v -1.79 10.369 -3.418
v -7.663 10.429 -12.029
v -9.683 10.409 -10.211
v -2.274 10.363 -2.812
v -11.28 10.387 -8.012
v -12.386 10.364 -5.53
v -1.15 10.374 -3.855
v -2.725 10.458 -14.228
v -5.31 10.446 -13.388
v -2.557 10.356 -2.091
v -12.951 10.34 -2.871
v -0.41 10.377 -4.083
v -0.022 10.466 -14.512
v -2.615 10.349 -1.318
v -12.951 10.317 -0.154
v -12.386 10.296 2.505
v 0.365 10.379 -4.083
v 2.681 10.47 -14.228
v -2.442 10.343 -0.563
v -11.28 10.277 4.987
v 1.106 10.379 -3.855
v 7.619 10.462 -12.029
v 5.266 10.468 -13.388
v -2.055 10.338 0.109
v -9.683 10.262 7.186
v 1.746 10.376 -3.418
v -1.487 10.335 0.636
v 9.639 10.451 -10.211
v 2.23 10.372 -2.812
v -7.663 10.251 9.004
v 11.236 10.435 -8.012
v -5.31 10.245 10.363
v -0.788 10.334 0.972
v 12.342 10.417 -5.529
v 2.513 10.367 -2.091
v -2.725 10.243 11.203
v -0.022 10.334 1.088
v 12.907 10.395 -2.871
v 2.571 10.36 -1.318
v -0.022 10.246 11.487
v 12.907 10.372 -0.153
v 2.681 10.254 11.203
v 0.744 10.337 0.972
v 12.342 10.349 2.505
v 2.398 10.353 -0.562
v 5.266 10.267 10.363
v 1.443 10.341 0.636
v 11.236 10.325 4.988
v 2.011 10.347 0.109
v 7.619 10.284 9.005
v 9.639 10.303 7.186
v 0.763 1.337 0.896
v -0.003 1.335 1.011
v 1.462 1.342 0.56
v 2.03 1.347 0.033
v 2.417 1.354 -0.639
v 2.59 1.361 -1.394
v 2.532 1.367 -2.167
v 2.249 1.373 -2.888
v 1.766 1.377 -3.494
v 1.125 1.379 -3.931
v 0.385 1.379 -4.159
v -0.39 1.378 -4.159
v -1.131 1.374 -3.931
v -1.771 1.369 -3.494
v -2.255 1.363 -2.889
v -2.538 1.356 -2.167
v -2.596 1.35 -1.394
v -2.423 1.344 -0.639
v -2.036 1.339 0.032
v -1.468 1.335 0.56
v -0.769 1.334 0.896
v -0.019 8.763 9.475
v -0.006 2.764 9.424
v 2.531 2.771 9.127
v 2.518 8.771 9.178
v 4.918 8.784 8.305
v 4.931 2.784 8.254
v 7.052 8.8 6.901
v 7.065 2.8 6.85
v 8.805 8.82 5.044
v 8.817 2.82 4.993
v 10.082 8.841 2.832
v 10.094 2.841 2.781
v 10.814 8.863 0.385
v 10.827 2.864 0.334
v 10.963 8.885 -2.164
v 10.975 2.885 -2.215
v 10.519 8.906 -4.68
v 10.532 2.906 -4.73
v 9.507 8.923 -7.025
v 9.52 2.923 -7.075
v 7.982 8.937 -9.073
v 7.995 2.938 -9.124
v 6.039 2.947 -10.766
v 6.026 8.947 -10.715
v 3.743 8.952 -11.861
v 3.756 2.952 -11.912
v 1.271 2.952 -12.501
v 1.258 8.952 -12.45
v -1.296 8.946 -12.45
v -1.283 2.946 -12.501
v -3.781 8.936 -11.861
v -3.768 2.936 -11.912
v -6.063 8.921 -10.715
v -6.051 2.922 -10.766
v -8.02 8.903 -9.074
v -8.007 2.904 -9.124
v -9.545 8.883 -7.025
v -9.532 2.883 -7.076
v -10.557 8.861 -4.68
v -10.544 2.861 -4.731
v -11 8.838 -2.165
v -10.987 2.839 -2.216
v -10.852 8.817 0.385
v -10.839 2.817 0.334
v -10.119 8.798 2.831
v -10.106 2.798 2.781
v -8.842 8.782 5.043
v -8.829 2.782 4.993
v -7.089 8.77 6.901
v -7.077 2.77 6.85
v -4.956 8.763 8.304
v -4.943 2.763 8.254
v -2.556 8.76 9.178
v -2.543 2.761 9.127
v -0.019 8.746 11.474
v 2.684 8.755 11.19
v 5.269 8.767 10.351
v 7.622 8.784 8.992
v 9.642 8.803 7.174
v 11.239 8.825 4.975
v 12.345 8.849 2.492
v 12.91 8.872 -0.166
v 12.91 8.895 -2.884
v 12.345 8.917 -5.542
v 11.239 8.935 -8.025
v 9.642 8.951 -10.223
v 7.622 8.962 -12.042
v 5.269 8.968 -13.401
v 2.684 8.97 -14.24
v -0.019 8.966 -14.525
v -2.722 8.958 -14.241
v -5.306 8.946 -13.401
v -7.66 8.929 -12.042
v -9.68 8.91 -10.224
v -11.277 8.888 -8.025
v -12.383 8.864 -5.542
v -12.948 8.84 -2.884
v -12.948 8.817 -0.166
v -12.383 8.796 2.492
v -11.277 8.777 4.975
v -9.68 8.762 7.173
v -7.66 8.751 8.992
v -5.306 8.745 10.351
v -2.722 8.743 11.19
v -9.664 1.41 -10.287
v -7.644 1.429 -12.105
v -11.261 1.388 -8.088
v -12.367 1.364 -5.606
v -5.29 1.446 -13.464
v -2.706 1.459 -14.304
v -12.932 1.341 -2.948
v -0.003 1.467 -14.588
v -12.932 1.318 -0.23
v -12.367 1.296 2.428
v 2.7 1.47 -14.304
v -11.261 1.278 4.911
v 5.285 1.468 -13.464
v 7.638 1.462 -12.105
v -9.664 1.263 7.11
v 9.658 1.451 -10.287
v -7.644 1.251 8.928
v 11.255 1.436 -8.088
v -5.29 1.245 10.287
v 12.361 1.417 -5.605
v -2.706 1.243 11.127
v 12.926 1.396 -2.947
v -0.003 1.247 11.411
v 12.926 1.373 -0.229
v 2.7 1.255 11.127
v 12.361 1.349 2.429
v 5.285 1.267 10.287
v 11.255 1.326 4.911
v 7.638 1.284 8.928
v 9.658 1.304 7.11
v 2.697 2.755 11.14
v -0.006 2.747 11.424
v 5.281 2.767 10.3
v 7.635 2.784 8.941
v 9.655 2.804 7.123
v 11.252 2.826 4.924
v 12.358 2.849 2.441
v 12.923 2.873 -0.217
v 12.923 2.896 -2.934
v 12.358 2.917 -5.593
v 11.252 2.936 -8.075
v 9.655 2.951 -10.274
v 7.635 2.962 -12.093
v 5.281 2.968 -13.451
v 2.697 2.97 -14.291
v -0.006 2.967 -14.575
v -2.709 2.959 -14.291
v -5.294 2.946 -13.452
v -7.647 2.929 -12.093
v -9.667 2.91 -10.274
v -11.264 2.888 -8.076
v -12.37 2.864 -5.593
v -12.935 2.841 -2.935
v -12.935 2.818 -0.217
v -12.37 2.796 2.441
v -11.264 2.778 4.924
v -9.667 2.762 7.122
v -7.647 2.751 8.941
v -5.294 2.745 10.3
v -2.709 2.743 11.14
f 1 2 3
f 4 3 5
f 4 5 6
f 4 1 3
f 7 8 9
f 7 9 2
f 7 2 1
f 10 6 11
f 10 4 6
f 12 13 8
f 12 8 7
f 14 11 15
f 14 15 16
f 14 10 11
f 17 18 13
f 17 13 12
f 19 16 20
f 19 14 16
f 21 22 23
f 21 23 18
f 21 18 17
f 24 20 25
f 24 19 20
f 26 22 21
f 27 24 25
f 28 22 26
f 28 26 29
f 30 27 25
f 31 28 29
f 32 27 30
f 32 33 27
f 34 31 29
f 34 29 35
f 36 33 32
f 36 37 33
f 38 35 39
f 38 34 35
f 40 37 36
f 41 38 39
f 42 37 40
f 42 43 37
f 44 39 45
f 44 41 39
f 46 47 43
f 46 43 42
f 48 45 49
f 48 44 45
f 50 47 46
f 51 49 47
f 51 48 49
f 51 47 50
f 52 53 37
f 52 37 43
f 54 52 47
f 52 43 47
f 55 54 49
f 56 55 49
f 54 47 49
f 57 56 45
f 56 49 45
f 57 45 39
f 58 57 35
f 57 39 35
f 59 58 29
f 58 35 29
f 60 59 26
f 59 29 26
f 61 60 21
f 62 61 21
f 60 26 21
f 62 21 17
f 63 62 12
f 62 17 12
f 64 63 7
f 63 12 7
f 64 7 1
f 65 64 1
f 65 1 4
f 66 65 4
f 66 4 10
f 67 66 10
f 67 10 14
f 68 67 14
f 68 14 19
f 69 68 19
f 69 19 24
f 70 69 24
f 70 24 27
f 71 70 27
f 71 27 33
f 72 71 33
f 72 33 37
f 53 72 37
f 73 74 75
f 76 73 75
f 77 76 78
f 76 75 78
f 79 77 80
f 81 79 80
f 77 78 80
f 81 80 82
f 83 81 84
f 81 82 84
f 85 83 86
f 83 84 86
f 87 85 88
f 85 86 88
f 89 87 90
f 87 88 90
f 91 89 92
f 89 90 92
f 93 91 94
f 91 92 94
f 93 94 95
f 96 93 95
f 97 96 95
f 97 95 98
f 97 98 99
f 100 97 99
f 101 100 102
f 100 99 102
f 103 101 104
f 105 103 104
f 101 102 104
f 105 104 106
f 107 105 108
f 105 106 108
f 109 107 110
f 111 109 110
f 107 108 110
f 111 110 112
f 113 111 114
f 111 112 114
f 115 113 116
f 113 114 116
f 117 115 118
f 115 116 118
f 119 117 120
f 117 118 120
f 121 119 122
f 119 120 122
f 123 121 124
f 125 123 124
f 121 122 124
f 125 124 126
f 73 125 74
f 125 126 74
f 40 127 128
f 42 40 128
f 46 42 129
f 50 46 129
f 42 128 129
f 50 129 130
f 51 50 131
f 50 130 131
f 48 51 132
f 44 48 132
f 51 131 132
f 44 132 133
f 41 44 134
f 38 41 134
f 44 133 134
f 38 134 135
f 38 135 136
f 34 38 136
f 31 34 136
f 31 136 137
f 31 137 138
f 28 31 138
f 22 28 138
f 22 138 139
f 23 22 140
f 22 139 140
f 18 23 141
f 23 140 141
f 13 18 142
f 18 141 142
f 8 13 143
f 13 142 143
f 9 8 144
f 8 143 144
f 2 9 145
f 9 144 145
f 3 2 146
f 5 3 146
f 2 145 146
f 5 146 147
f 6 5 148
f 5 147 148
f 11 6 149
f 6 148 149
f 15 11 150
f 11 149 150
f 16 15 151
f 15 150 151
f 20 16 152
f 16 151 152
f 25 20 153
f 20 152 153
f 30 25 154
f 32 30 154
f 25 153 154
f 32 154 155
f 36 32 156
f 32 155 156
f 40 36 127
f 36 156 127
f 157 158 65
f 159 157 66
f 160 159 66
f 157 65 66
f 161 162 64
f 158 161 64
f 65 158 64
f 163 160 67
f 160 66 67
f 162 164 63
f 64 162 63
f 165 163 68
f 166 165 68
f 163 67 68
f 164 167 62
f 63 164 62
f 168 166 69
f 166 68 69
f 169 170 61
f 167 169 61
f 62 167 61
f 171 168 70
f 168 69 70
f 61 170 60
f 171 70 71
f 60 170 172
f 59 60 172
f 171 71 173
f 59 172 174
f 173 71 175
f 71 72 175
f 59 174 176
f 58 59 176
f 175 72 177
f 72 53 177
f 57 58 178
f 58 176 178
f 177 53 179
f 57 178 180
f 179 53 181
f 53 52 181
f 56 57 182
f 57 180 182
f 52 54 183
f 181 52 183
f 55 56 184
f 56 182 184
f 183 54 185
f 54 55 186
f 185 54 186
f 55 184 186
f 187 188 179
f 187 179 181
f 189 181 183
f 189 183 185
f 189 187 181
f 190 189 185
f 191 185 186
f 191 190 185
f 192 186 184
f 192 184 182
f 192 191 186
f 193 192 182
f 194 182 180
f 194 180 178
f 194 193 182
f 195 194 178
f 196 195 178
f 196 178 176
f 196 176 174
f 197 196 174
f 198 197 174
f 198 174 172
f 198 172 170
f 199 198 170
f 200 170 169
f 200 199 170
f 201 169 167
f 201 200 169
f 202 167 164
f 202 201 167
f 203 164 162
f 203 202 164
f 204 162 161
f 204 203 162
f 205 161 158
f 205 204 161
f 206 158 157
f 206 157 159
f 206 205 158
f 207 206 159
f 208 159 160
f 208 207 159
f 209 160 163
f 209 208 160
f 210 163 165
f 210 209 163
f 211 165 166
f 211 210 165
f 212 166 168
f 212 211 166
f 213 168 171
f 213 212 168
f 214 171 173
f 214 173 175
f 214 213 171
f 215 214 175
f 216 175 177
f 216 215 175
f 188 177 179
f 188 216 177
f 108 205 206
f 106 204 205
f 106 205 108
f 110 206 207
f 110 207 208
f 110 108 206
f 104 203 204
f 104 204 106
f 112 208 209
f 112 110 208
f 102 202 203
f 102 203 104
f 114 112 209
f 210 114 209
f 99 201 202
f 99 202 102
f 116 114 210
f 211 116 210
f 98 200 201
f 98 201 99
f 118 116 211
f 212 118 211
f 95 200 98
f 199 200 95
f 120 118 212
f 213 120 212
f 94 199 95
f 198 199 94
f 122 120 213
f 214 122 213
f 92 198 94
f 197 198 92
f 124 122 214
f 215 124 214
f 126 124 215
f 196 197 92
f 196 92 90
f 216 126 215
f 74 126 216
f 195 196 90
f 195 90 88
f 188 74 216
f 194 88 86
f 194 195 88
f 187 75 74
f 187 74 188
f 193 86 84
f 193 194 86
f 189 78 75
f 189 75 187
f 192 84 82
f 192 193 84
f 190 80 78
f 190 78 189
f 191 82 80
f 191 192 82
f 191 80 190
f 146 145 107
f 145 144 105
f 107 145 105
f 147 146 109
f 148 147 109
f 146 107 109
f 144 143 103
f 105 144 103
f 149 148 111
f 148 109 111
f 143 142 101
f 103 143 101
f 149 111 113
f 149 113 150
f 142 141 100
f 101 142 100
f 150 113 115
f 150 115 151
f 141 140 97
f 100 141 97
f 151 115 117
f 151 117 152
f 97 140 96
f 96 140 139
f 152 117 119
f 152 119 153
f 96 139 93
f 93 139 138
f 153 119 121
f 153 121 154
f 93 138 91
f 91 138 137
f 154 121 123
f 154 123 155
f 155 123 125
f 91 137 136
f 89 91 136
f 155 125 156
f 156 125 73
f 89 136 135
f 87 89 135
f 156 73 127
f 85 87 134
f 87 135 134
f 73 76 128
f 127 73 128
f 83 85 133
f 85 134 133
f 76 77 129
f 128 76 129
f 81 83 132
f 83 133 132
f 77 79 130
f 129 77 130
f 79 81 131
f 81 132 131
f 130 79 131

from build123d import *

# Parameters (mm, degrees)
SKETCH2_R           = 11
BOSS_EXTRUDE1_DEPTH = 6
SKETCH3_W           = 3.45
SKETCH3_H           = 3.45
CUT_EXTRUDE1_DEPTH  = 18.841034143
SKETCH4_R           = 13
BOSS_EXTRUDE2_DEPTH = 1.5
SKETCH5_W           = 3.45
SKETCH5_H           = 3.45
CUT_EXTRUDE2_DEPTH  = 22.625712586
SKETCH6_R           = 2.6
CUT_EXTRUDE3_DEPTH  = 22.625712586


with BuildPart() as part:
    # Sketch2 → Boss-Extrude1 (new body)
    with BuildSketch(Plane(origin=(-0.006046198, 2.843115255, 0.024063532), x_dir=(0.9999977389340391, 0.002126453123543878, 1.7997853821493017e-05), z_dir=(-0.00212652928721231, 0.9999619230641714, 0.008463468260412206))):
        with Locations(Location((-2.8797e-05, 1.599942694, 0), (0, 0, 270))):
            Circle(SKETCH2_R)
    extrude(amount=BOSS_EXTRUDE1_DEPTH)

    # Sketch3 → Cut-Extrude1 (cut, through all)
    with BuildSketch(Plane(origin=(-0.018805374, 8.842886793, 0.074844342), x_dir=(0.9999977389340391, 0.002126453123543878, 1.7997853821493024e-05), z_dir=(-0.00212652928721231, 0.9999619230641714, 0.00846346826041221))):
        with Locations((-2.8797e-05, 1.599942694)):
            Rectangle(SKETCH3_W, SKETCH3_H)
    extrude(amount=-CUT_EXTRUDE1_DEPTH, mode=Mode.SUBTRACT)

    # Sketch4 → Boss-Extrude2 (add)
    with BuildSketch(Plane(origin=(-0.018805374, 8.842886793, 0.074844342), x_dir=(0.9999977389340391, 0.002126453123543878, 1.7997853821493024e-05), z_dir=(-0.00212652928721231, 0.9999619230641714, 0.00846346826041221))):
        with Locations(Location((-2.8797e-05, 1.599942694, 0), (0, 0, 270))):
            Circle(SKETCH4_R)
    boss_extrude2 = extrude(amount=BOSS_EXTRUDE2_DEPTH)

    # Mirror1: Boss-Extrude2 across plane
    add(boss_extrude2.mirror(Plane(origin=(-0.012425786, 5.843001024, 0.049453937), x_dir=(1.79984577561216e-05, -0.008463449122581367, 0.9999641842111171), z_dir=(0.00212652928721231, -0.9999619230641714, -0.00846346826041221))))

    # Sketch5 → Cut-Extrude2 (cut, through all)
    with BuildSketch(Plane(origin=(-0.021995168, 10.342829678, 0.087539544), x_dir=(0.9999977389340391, 0.002126453123543878, 1.799785382149303e-05), z_dir=(-0.00212652928721231, 0.9999619230641714, 0.008463468260412213))):
        with Locations((-2.8797e-05, 1.599942694)):
            Rectangle(SKETCH5_W, SKETCH5_H)
    extrude(amount=-CUT_EXTRUDE2_DEPTH, mode=Mode.SUBTRACT)

    # Sketch6 → Cut-Extrude3 (cut, through all)
    with BuildSketch(Plane(origin=(-0.021995168, 10.342829678, 0.087539544), x_dir=(0.9999977389340391, 0.002126453123543878, 1.799785382149303e-05), z_dir=(-0.00212652928721231, 0.9999619230641714, 0.008463468260412213))):
        with Locations(Location((-2.8797e-05, 1.599942694, 0), (0, 0, 270))):
            Circle(SKETCH6_R)
    extrude(amount=-CUT_EXTRUDE3_DEPTH, mode=Mode.SUBTRACT)


solid = part.part
